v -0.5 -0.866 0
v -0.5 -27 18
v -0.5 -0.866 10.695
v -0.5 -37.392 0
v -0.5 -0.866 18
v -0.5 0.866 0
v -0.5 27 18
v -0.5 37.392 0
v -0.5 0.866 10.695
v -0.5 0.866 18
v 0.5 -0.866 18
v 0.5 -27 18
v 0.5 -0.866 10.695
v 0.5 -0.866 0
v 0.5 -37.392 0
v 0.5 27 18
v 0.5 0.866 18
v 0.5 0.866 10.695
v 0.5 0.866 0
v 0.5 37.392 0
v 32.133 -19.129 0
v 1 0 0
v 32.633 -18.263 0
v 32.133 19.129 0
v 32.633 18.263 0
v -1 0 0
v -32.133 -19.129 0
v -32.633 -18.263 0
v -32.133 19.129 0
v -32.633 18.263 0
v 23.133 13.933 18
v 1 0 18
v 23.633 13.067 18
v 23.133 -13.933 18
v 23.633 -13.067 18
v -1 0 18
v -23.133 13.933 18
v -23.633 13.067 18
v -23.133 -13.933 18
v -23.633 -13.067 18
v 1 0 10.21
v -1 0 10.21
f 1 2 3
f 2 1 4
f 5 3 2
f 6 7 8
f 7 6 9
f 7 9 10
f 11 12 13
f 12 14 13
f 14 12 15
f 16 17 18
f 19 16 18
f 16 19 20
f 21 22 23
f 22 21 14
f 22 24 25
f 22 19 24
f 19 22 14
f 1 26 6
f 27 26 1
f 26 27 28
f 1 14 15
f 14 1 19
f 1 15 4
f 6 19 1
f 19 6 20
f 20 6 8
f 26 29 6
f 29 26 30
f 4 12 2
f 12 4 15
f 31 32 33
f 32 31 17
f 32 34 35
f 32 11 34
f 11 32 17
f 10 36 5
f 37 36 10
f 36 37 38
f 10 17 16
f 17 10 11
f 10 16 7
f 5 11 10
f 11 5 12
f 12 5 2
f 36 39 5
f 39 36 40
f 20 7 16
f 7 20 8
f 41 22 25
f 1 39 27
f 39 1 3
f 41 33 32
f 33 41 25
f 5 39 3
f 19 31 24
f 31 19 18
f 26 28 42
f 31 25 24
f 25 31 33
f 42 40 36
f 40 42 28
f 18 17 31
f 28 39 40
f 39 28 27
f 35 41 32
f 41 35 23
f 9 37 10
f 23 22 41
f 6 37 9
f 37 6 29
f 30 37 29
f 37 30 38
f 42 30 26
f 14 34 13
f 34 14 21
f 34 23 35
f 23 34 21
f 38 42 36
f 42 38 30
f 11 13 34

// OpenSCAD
lower = 54;

//    /|
//   /_|

// oposite = height
// angle = 60
// soh cah toa, tangent(60) = o/a
// a = o / tangent(60);

//higher = 80;
height = 18;
a = height / tan(60);
higher = lower + a * 2;
echo (higher);


module pg(){
    polygon([[0, - lower / 2], 
            [0, lower / 2],
            [height, higher / 2],
            [height, - higher / 2]]);
}

module ph(){
    rotate([0, 90, 0]) 
    linear_extrude(height=1, center=true) pg();
}

for (i=[0:2]){
translate([0, 0, height]) rotate([0, 0, 120 * i]) ph();
}
